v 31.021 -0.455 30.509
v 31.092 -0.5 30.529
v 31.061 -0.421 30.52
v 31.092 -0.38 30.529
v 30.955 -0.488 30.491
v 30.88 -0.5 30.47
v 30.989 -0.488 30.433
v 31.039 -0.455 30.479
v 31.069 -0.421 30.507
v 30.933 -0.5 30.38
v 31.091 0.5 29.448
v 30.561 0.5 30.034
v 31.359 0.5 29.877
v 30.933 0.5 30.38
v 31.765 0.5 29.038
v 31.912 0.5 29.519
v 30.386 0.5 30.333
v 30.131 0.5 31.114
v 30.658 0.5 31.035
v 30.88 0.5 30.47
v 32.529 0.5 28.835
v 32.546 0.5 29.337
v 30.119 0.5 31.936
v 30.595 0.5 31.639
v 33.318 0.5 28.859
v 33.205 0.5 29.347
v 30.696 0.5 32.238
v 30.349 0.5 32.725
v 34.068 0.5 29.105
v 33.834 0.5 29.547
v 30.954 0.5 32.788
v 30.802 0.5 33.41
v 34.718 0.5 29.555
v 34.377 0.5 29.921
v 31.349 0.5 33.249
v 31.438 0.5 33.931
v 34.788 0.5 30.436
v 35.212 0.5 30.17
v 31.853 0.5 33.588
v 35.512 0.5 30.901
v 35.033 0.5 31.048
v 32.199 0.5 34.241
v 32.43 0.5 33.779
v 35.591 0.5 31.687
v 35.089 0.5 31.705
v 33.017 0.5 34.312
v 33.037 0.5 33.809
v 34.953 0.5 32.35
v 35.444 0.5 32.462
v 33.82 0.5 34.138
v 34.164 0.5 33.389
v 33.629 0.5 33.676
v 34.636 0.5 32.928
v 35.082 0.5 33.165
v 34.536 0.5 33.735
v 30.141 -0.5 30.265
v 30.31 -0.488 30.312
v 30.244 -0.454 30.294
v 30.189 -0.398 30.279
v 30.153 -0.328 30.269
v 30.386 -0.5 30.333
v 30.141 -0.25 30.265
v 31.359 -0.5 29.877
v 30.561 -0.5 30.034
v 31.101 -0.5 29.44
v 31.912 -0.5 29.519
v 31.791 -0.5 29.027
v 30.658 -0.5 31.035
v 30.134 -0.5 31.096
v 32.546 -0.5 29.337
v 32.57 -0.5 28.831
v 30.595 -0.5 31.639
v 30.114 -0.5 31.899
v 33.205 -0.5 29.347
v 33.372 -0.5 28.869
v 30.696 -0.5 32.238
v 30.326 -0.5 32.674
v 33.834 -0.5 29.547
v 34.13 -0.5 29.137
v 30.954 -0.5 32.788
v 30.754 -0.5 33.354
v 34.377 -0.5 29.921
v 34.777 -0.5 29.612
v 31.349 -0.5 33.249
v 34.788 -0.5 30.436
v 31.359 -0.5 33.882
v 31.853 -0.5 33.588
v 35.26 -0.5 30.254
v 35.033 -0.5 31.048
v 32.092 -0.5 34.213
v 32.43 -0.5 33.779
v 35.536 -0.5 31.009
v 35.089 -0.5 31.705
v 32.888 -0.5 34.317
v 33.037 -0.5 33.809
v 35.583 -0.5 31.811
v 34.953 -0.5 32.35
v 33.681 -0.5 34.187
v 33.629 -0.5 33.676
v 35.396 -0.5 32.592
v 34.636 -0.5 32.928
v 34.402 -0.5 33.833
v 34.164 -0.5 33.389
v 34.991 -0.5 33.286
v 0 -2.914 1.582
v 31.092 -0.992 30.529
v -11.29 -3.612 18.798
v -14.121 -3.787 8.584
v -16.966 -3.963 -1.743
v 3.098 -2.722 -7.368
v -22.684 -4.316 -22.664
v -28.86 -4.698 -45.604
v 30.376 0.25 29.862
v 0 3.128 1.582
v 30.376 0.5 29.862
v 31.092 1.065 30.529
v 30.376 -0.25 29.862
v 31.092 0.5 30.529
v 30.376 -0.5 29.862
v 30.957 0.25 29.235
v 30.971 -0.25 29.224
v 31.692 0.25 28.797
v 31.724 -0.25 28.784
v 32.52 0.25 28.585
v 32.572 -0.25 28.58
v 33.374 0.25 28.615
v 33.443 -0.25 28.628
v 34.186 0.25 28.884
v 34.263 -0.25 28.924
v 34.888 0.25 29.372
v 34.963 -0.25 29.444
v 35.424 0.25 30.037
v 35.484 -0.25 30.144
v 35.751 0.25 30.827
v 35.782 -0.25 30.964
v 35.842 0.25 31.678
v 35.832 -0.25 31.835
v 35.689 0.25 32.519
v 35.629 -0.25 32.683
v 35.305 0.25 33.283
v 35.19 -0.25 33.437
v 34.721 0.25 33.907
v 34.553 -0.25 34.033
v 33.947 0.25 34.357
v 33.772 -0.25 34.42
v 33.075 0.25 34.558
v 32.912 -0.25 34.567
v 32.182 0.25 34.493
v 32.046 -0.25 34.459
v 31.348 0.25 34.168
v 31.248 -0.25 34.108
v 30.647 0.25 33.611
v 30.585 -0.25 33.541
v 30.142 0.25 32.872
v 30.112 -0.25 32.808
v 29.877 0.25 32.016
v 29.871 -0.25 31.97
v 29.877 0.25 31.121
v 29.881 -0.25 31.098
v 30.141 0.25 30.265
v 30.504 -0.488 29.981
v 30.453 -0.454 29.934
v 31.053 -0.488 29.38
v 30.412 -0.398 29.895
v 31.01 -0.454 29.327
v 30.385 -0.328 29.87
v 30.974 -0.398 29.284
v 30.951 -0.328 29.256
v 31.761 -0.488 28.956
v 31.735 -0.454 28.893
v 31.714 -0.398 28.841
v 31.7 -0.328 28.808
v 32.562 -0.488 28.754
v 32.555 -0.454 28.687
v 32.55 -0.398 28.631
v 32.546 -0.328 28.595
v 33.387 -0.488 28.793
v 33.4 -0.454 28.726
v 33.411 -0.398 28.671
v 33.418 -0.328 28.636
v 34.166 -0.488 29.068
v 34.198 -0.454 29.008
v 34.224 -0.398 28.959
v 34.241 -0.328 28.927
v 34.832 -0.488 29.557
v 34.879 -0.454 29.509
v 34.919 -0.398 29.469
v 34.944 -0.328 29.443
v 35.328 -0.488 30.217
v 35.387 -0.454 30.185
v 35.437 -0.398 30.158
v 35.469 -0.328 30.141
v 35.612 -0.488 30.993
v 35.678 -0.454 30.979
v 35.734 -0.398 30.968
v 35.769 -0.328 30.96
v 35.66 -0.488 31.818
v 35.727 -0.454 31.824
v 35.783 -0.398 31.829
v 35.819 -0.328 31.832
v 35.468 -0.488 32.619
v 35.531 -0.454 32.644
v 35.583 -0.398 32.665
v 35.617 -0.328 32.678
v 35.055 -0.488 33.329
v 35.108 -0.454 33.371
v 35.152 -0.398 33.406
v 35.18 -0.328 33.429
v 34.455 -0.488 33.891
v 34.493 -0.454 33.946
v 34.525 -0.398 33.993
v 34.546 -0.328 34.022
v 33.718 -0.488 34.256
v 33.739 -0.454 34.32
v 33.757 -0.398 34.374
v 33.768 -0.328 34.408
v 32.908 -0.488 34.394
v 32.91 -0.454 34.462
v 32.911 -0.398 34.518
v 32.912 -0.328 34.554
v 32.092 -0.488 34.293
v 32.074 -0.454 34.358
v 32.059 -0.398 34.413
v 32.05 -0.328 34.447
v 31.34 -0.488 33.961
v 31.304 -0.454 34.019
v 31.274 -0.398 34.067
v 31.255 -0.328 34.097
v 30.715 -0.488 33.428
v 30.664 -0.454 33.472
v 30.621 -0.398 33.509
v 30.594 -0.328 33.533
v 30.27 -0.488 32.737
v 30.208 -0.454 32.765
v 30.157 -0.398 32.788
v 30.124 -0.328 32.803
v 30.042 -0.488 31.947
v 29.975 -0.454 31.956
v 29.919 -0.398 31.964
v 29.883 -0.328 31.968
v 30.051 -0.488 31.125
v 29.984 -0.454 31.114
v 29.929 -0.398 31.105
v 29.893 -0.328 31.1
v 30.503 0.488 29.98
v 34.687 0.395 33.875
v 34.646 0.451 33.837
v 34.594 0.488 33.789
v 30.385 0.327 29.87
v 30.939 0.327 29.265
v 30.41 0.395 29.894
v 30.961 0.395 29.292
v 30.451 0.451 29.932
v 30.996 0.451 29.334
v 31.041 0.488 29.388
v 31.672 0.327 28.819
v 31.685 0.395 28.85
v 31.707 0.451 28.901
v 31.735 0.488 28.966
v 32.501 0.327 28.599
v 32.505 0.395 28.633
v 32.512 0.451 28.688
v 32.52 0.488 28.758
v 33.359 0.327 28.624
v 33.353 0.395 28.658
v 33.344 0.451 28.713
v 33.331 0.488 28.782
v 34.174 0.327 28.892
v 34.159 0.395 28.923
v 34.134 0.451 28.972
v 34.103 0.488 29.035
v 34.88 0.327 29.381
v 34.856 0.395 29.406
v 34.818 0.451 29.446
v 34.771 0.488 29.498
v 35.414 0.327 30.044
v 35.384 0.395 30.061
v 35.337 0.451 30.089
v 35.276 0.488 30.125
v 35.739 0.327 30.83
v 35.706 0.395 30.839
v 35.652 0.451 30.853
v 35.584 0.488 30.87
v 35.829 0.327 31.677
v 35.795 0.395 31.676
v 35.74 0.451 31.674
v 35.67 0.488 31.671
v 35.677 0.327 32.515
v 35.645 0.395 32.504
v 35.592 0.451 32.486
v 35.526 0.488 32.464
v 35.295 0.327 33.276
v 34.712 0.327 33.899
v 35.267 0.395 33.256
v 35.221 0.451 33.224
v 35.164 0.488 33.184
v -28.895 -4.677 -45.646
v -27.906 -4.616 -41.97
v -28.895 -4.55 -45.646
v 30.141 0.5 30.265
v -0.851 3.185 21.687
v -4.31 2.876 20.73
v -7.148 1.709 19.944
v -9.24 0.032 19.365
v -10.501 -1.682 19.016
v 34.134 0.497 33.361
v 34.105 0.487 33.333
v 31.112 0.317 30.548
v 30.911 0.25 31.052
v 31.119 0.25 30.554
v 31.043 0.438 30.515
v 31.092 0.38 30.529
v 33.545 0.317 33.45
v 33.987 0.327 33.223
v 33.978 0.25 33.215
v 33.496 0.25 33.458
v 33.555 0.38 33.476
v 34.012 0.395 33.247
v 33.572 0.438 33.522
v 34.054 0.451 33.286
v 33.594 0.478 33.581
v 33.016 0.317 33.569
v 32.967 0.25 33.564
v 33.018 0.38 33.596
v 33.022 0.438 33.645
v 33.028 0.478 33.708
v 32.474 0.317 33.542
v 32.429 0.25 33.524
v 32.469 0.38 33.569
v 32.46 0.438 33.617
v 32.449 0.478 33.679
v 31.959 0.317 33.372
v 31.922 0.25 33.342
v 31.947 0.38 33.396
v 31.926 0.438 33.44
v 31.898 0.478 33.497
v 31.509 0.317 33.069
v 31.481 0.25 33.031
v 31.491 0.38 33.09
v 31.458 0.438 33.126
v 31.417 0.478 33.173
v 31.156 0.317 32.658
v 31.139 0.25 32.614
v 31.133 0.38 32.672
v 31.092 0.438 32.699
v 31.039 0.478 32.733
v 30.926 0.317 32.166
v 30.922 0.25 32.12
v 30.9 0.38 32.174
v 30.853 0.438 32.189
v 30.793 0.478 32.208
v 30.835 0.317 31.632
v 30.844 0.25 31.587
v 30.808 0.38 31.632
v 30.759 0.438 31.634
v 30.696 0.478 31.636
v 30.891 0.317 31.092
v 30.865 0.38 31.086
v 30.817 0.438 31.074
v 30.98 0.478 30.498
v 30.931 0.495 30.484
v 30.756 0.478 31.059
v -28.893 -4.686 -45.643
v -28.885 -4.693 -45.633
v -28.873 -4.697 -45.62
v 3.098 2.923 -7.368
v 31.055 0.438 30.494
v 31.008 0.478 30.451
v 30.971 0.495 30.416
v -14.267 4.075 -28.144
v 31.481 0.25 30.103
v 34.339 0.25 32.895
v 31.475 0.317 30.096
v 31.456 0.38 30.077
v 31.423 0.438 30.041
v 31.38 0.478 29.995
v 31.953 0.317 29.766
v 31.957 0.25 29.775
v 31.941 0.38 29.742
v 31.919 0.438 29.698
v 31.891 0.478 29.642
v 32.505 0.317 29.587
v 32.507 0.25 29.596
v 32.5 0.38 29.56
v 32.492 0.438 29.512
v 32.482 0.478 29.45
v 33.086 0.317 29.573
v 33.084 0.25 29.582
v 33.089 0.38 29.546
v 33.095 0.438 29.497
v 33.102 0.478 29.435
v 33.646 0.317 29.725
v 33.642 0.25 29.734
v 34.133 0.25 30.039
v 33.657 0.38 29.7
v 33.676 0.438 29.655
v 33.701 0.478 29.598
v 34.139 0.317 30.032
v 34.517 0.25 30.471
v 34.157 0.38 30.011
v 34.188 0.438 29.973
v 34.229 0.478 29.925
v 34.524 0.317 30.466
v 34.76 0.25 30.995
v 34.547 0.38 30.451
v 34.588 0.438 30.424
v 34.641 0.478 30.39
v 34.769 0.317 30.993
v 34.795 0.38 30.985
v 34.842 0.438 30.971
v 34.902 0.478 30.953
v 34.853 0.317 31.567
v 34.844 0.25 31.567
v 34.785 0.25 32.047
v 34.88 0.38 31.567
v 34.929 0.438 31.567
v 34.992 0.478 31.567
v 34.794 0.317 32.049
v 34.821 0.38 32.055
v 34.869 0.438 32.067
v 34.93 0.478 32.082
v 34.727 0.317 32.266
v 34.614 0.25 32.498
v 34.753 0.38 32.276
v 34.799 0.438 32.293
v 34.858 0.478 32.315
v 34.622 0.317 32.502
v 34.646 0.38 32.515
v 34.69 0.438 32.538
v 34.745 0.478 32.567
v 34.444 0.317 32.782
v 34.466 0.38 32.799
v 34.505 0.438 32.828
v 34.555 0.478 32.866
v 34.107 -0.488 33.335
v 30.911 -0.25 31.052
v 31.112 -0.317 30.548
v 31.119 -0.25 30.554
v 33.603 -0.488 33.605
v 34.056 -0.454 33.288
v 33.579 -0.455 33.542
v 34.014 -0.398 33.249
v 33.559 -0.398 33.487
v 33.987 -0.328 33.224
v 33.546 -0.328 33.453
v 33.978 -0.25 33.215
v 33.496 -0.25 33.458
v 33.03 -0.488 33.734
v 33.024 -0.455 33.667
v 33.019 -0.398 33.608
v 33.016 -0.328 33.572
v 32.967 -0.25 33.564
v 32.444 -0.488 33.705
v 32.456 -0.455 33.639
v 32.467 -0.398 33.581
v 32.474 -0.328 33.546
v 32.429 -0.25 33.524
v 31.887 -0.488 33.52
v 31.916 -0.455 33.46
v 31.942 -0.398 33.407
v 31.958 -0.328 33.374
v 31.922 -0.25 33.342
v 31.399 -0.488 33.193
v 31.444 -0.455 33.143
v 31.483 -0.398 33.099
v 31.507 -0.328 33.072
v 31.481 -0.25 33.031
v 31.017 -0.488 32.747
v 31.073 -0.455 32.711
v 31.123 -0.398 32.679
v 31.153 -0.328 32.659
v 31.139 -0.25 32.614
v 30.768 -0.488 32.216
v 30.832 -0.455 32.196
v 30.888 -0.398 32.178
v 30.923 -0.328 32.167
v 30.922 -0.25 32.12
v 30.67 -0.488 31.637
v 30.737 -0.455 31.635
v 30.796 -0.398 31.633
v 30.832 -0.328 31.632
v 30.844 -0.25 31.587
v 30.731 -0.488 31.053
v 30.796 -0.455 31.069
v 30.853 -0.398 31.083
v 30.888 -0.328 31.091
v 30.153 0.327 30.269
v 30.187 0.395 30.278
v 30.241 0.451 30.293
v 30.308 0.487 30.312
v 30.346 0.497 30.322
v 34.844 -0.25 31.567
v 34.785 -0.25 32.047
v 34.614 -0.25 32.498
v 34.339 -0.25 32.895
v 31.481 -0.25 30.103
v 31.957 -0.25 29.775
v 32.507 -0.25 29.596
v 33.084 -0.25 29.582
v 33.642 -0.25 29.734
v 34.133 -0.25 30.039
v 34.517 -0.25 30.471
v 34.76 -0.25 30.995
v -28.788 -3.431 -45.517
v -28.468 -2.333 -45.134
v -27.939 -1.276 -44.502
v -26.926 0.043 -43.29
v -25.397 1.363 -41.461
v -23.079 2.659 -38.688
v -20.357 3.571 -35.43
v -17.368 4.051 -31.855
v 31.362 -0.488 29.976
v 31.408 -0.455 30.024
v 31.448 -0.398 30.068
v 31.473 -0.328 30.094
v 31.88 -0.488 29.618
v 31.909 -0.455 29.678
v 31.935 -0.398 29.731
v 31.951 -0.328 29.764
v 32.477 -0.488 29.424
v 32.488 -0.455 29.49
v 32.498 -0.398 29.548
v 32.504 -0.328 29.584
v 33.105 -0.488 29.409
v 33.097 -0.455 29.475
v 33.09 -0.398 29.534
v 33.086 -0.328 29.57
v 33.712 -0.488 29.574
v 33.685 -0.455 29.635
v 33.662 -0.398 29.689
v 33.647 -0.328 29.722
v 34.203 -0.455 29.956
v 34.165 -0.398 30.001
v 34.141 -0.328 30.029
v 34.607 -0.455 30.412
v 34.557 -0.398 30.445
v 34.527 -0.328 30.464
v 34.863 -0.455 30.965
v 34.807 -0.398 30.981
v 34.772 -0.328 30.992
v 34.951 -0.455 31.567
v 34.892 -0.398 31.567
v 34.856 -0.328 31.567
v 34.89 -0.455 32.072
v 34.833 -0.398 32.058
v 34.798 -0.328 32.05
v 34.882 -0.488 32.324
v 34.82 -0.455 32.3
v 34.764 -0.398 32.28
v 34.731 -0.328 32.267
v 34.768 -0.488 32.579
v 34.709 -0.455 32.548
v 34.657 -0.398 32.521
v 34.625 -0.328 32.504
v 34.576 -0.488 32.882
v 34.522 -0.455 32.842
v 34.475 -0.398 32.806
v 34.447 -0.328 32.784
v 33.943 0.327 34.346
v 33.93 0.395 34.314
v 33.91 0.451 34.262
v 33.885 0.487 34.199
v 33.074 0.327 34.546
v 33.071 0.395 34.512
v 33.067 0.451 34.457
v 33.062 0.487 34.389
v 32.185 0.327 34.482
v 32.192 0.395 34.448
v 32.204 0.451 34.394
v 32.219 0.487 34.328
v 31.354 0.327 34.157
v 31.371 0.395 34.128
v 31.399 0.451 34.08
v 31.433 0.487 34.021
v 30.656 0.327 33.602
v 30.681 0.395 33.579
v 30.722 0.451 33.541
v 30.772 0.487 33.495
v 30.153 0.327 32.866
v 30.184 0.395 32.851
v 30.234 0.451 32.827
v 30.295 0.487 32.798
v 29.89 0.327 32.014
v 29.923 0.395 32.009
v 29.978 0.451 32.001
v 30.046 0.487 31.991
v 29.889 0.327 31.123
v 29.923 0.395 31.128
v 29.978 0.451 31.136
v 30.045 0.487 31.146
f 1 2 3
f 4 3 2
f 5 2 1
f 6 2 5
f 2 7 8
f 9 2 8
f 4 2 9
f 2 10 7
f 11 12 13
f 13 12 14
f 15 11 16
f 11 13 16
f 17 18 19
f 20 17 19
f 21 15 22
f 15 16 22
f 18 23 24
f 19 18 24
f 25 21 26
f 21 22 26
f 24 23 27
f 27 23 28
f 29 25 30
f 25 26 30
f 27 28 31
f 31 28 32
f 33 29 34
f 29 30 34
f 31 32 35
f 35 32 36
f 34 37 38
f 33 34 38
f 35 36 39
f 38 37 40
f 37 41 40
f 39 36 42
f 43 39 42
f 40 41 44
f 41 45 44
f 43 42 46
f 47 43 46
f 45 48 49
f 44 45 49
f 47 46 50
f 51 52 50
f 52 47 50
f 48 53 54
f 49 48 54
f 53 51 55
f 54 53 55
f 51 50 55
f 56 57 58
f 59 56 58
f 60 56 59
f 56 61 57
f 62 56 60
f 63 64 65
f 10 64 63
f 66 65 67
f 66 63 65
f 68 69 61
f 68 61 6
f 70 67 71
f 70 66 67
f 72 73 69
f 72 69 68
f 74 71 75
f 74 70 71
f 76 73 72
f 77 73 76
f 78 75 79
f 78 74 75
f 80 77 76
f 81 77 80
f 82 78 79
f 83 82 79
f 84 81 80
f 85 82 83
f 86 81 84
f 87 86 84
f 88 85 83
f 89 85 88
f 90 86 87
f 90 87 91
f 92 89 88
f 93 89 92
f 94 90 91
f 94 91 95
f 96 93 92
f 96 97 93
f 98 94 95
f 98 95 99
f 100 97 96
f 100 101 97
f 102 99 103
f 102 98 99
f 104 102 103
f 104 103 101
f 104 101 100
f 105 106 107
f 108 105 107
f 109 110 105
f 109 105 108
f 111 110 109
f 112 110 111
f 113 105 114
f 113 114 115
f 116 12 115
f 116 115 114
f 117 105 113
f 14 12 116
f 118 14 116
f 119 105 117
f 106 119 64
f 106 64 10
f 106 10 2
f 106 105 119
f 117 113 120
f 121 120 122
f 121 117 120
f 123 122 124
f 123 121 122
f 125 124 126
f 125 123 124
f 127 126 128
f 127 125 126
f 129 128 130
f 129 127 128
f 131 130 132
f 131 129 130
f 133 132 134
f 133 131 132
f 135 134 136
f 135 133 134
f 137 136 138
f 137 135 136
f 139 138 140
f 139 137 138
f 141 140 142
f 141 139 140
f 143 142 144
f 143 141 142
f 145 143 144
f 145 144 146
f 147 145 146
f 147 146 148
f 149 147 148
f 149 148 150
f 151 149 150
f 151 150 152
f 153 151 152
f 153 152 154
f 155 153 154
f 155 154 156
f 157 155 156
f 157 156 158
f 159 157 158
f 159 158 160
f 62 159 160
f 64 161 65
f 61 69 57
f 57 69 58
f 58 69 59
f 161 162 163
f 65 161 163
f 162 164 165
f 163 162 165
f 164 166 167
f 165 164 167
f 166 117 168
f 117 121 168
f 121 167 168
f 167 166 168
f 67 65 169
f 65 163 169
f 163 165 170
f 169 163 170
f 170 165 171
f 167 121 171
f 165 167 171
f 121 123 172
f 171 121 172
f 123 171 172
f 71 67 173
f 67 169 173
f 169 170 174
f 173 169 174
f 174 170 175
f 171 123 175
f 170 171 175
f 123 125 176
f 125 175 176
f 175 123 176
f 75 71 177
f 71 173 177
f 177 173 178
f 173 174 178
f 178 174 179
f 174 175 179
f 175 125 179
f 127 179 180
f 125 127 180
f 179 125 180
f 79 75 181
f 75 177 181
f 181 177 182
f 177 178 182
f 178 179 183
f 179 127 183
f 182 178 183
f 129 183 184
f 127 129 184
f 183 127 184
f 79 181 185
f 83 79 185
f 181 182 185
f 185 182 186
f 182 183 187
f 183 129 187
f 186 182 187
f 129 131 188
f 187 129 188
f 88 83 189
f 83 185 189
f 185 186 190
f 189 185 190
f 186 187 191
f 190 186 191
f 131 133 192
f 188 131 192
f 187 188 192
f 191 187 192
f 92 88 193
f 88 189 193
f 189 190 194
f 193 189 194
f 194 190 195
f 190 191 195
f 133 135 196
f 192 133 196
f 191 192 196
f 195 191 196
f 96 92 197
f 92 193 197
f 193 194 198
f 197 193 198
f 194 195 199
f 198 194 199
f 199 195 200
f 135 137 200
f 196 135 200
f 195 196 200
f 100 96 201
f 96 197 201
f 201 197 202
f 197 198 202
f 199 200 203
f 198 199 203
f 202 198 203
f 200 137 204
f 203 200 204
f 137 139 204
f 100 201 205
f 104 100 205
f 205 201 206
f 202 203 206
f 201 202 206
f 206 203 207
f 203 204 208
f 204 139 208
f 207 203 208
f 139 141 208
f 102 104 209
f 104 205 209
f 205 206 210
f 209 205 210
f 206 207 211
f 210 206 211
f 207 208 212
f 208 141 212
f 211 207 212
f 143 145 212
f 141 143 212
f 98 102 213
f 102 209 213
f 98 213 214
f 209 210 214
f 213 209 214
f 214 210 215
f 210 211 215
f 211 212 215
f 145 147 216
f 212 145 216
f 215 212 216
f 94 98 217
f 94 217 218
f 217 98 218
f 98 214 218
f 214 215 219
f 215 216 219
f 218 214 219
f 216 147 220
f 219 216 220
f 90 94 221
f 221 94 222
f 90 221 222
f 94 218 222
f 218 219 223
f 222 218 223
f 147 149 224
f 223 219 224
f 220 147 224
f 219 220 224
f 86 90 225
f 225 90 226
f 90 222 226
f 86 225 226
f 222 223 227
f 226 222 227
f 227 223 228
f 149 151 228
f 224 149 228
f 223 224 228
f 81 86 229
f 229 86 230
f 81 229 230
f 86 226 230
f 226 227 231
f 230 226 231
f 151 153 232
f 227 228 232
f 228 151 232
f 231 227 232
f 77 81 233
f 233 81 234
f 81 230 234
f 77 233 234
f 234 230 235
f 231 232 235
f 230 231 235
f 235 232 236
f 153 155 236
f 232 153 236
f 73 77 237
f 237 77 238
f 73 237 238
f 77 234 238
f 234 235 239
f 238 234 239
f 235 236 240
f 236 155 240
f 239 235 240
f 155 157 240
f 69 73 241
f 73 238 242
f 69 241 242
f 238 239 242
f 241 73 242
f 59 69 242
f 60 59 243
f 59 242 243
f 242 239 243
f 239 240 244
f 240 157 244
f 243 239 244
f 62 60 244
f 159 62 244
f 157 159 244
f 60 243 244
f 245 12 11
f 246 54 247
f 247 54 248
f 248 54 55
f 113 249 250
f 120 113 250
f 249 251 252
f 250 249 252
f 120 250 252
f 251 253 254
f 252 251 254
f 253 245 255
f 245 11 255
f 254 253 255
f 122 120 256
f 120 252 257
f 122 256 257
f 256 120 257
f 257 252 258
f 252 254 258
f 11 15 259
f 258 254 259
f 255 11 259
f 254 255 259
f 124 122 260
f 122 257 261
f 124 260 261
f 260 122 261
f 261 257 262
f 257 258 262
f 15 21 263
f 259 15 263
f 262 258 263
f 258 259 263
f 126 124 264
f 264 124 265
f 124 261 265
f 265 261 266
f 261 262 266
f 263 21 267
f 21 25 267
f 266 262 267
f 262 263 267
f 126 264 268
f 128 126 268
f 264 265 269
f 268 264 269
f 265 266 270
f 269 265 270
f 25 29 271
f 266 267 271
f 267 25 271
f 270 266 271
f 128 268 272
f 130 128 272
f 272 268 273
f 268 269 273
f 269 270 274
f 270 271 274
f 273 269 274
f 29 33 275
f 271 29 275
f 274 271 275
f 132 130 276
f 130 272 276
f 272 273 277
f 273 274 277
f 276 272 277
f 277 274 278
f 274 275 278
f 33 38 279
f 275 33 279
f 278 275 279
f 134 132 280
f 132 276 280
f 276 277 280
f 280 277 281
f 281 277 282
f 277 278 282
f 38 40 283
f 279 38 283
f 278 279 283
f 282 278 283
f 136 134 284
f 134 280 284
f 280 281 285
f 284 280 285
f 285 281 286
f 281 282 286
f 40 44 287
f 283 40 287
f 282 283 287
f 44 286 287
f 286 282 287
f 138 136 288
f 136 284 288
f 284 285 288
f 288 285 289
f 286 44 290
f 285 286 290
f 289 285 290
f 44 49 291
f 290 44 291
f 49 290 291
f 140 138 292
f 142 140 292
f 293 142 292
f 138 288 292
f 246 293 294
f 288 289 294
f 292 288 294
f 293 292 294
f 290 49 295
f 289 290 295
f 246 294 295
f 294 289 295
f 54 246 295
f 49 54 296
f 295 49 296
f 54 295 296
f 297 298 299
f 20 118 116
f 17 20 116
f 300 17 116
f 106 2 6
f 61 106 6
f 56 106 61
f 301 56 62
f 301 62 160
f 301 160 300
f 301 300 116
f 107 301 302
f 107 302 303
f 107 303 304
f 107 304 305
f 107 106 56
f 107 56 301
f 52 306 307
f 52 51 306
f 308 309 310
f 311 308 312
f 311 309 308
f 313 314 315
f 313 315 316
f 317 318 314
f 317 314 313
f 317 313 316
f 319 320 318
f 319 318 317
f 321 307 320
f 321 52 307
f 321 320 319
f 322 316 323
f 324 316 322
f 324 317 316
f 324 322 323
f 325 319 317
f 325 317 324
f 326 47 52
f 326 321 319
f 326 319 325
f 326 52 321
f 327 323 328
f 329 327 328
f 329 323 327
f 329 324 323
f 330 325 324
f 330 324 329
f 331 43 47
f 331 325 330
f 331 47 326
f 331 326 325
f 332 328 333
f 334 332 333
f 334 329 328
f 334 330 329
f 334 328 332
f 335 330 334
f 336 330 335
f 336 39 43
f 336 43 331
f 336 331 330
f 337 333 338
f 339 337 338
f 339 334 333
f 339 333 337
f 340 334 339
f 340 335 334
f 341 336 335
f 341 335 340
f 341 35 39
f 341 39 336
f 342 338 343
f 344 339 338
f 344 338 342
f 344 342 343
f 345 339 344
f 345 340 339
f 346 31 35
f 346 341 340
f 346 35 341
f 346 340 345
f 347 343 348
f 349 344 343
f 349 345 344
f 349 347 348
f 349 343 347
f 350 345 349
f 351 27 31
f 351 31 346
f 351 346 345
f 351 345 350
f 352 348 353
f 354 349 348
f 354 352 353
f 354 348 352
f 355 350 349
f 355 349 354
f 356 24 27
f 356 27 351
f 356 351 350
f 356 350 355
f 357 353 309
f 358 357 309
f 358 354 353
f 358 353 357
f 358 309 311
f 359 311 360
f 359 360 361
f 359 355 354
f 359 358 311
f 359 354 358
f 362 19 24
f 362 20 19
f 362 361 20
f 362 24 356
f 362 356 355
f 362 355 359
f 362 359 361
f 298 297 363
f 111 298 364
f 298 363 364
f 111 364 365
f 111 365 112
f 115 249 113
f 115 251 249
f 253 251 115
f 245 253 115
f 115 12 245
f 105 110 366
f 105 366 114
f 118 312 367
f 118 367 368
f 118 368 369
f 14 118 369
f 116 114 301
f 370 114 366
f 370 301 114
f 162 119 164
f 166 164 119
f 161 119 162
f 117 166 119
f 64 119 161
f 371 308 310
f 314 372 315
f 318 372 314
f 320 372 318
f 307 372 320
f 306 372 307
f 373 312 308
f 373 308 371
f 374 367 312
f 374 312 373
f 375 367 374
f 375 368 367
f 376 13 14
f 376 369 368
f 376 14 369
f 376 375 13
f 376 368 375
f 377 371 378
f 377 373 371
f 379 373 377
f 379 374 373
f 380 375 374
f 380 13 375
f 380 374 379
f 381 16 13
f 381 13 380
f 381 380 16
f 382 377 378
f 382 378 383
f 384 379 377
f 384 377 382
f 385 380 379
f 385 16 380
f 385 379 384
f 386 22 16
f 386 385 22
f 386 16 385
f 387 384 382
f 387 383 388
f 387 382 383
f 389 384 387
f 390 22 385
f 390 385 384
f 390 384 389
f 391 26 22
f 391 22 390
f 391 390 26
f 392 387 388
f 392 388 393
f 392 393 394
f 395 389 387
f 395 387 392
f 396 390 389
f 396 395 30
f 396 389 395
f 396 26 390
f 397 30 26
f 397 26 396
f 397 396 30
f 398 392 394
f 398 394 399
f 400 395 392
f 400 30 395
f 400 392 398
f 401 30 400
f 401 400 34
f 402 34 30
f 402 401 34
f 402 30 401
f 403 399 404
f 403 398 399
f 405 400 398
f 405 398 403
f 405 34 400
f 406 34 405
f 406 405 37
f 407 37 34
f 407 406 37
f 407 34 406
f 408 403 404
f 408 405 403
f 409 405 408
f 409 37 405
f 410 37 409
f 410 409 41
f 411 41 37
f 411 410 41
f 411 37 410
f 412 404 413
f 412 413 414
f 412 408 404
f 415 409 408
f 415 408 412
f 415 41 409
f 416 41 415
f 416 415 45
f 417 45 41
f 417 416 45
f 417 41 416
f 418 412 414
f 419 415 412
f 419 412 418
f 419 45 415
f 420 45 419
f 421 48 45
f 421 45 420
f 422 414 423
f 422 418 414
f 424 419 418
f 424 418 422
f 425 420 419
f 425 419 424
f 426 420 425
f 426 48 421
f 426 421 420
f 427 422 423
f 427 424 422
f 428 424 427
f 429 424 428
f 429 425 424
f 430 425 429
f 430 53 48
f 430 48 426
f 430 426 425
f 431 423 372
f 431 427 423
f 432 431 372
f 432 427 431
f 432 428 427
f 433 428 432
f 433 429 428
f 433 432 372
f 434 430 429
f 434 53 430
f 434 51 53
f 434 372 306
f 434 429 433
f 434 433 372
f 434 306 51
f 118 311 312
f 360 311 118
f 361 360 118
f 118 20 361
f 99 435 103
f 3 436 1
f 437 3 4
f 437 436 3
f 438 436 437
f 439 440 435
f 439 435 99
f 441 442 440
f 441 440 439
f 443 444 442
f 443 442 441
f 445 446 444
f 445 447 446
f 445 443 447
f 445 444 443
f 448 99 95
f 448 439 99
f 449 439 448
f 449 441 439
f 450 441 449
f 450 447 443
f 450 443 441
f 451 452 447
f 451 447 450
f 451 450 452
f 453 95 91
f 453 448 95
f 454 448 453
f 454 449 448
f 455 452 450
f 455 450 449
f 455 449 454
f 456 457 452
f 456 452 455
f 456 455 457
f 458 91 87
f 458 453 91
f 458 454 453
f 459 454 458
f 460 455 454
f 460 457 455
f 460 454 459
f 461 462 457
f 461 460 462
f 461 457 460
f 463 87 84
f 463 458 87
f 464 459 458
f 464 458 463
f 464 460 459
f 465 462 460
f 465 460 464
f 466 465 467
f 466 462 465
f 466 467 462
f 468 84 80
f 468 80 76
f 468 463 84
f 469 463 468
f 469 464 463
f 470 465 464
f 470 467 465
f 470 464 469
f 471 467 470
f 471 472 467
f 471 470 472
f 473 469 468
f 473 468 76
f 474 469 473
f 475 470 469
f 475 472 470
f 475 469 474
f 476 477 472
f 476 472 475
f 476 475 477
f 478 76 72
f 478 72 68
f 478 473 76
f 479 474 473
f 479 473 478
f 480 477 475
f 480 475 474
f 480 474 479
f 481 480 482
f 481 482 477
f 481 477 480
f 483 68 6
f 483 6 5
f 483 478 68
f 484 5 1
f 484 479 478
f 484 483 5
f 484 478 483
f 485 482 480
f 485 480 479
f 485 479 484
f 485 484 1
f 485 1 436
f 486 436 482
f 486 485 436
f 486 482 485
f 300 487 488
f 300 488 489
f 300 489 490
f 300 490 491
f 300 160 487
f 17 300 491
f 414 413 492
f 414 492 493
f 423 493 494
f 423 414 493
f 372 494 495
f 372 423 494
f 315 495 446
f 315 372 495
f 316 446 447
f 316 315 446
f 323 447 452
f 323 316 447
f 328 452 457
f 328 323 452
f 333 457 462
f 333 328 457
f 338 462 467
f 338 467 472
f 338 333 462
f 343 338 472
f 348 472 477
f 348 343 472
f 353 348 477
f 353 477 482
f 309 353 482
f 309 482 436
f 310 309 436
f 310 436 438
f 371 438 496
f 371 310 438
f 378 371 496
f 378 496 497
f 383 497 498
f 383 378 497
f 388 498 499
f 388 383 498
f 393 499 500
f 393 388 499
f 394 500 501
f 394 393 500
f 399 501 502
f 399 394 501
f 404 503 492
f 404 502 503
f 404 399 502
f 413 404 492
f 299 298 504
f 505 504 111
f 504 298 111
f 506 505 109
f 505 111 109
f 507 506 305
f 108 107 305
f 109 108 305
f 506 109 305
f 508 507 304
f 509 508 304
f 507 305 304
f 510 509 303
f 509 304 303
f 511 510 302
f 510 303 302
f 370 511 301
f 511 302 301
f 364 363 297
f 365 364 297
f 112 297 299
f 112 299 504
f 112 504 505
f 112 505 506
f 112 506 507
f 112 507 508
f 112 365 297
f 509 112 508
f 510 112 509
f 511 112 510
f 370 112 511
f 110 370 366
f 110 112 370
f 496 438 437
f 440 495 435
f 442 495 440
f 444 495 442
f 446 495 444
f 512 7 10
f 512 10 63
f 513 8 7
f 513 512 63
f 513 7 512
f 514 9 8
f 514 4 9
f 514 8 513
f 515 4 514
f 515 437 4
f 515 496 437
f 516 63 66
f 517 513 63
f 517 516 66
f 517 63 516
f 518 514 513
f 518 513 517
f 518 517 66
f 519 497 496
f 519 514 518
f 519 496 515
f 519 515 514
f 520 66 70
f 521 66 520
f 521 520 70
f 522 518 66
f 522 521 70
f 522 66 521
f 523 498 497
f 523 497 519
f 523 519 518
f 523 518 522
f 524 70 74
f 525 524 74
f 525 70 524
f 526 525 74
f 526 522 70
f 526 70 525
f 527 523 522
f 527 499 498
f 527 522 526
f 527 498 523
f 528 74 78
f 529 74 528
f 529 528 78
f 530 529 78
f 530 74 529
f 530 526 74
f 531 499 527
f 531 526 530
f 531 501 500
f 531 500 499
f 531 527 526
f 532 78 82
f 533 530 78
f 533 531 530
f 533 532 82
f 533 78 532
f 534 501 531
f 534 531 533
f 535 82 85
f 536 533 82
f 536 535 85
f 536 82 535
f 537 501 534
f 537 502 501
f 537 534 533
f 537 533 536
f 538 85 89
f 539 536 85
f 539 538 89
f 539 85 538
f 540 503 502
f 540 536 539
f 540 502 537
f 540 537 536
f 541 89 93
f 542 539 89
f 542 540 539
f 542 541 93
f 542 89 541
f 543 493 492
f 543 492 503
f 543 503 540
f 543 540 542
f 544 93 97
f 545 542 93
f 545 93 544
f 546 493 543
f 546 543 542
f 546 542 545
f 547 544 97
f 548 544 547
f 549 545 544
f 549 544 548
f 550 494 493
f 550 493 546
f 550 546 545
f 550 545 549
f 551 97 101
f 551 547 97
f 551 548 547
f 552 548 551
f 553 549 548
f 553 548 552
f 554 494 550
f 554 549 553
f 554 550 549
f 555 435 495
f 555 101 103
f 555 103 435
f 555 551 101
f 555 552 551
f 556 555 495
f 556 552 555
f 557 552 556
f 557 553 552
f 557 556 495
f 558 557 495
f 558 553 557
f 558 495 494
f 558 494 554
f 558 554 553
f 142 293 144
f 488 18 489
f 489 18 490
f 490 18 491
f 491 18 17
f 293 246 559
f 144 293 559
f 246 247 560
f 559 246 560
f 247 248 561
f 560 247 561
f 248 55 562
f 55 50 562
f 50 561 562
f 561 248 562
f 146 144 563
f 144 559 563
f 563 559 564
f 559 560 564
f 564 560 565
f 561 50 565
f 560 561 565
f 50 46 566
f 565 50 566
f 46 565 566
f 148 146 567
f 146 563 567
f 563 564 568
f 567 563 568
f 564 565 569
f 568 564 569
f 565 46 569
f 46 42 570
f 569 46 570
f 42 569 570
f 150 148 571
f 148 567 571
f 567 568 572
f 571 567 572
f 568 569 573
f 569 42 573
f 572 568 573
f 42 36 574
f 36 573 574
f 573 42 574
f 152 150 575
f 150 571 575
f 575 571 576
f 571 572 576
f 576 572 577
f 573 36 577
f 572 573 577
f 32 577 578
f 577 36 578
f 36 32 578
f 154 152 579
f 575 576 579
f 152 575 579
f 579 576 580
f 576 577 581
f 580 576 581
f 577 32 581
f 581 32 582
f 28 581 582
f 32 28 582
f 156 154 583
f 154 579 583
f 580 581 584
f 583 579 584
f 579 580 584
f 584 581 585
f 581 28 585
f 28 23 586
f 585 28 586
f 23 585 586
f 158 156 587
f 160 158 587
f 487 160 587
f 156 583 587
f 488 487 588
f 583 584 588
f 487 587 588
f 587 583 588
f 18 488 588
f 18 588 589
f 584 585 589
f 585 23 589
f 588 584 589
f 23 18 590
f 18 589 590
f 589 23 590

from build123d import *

# Parameters (mm, degrees)
F1_DEPTH      = 5
F1_DEPTH_BACK = 5
F2_W          = 100.360032171
F2_H          = 34.278569743
F3_DEPTH      = 63.9
F3_DEPTH_BACK = 50
F4_R          = 0.0218183936
F5_T1_DEPTH   = 111.9716351384
F6_R          = 3
F6_R_2        = 2
F7_DEPTH      = 0.5
F7_DEPTH_BACK = 0.5
F8_T4_ANGLE   = 359.64
F8_T9_ANGLE   = 359.64
F8_T34_ANGLE  = 359.64
F8_T39_ANGLE  = 359.64


# Not quite as in the source:
# - a fillet or chamfer that OpenCascade refuses, or shapes differently, is made with other operations: its cross-section is extruded or revolved along the edge and cut away or added


with BuildPart() as f1:
    # F0 (on Front) → F1 (new body, two sides)
    with BuildSketch(Plane.XZ) as f1_sk:
        Polygon((31.0921985656, 30.5286794901), (-11.5655744448, 18.7216177583), (-28.8952961564, -45.6459186971), (3.0980354641, -7.3681822978), (0, 1.582333236), align=None)
    extrude(amount=F1_DEPTH)
    extrude(f1_sk.sketch, amount=-F1_DEPTH_BACK)

    # F2 (on Top) → F3 (cut, two sides)
    with BuildSketch(Plane.XY) as f3_sk:
        with Locations((1.9043665379, 3.6182934418)):
            Rectangle(F2_W, F2_H)
        Polygon((-39.0896312892, -5.3307767957), (-39.0896312892, 5.7227437609), (47.1330322325, 0), align=None, mode=Mode.SUBTRACT)
    extrude(amount=-F3_DEPTH, mode=Mode.SUBTRACT)
    extrude(f3_sk.sketch, amount=F3_DEPTH_BACK, mode=Mode.SUBTRACT)

    # F4
    f4_edges = [f1.edges().sort_by_distance(p)[0] for p in [
        (-20.230435, -4.164794, -13.46215),
    ]]
    fillet(f4_edges, radius=F4_R)

    # F5: fillet of radius 9 on 2 edges, made by hand

    # F5_s2 → F5_t1 (cut)
    with BuildSketch(Plane(origin=(10.1347631785, -0.6726613442, 37.6434053136), x_dir=(-0.0662259794, -0.99780465, 0), z_dir=(-0.259934786, 0.0172523106, -0.9654720425))):
        with BuildLine():
            ThreePointArc((6.4541084226, 15.6543338505), (-0.2785467468, 13.2370471707), (-3.1214312203, 6.6727552521))
            Line((-3.1214312203, 6.6727552521), (-3.1214312203, 16.2679345229))
            Line((-3.1214312203, 16.2679345229), (6.4541084226, 15.6543338505))
        make_face()
    extrude(amount=F5_T1_DEPTH, mode=Mode.SUBTRACT)

    # F6 (on Front) → F7 (join, two sides)
    with BuildSketch(Plane.XZ) as f7_sk:
        with Locations((32.8437015414, 31.5673612058)):
            Circle(F6_R)
        with Locations((32.8437015414, 31.5673612058)):
            Circle(F6_R_2, mode=Mode.SUBTRACT)
    extrude(amount=F7_DEPTH)
    extrude(f7_sk.sketch, amount=-F7_DEPTH_BACK)

    # F8: fillet of radius 0.25 on 4 edges, made by hand


with BuildPart() as f8_tool2:
    # F8_s3 → F8_t4 (revolve)
    with BuildSketch(Plane(origin=(-5.375639349, 0, 9.1752631985), x_dir=(0, 1, 0), z_dir=(-0.5055120978, 0, 0.8628195171))):
        with BuildLine():
            ThreePointArc((0.25, -41.2958696863), (0.4267766953, -41.369092991), (0.5, -41.5458696863))
            Line((0.5, -41.5458696863), (0.5, -41.2958696863))
            Line((0.5, -41.2958696863), (0.25, -41.2958696863))
        make_face()
    revolve(axis=Axis((32.8437015414, 0.5, 31.5673612058), (0, -1, 0)), revolution_arc=F8_T4_ANGLE)

    split(bisect_by=Plane(origin=(-0.7891478665, 0, 0.8476490244), x_dir=(0, 1, 0), z_dir=(0.6813988218, 0, -0.731912321)), keep=Keep.TOP)


with BuildPart() as f1_1:
    add(f1.part)

    # F8_t1: cut F8_tool2
    add(f8_tool2.part, mode=Mode.SUBTRACT)


with BuildPart() as f8_tool7:
    # F8_s8 → F8_t9 (revolve)
    with BuildSketch(Plane(origin=(-5.375639349, 0, 9.1752631985), x_dir=(0, 1, 0), z_dir=(-0.5055120978, 0, 0.8628195171))):
        with BuildLine():
            ThreePointArc((0.25, -41.2958696863), (0.4267766953, -41.369092991), (0.5, -41.5458696863))
            Line((0.5, -41.5458696863), (0.5, -41.2958696863))
            Line((0.5, -41.2958696863), (0.25, -41.2958696863))
        make_face()
    revolve(axis=Axis((32.8437015414, 0.5, 31.5673612058), (0, -1, 0)), revolution_arc=F8_T9_ANGLE)

    split(bisect_by=Plane(origin=(-5.636132621, 0, 20.3628024875), x_dir=(0, 1, 0), z_dir=(-0.2667561154, 0, 0.963764066)), keep=Keep.TOP)


with BuildPart() as f1_2:
    add(f1_1.part)

    # F8_t6: cut F8_tool7
    add(f8_tool7.part, mode=Mode.SUBTRACT)


with BuildPart() as f8_tool12:
    # F8_s13 → F8_t14 (revolve)
    with BuildSketch(Plane.XY.offset(31.5673612058)):
        with BuildLine():
            ThreePointArc((35.0937015414, -0.5), (34.9169248461, -0.4267766953), (34.8437015414, -0.25))
            Line((34.8437015414, -0.25), (34.8437015414, -0.5))
            Line((34.8437015414, -0.5), (35.0937015414, -0.5))
        make_face()
    revolve(axis=Axis((32.8437015414, -0.5, 31.5673612058), (0, -1, 0)))

    split(bisect_by=Plane(origin=(-0.7891478665, 0, 0.8476490244), x_dir=(0, 1, 0), z_dir=(0.6813988218, 0, -0.731912321)), keep=Keep.TOP)


with BuildPart() as f1_3:
    add(f1_2.part)

    # F8_t11: cut F8_tool12
    add(f8_tool12.part, mode=Mode.SUBTRACT)


with BuildPart() as f8_tool17:
    # F8_s18 → F8_t19 (revolve)
    with BuildSketch(Plane.XY.offset(31.5673612058)):
        with BuildLine():
            ThreePointArc((35.0937015414, -0.5), (34.9169248461, -0.4267766953), (34.8437015414, -0.25))
            Line((34.8437015414, -0.25), (34.8437015414, -0.5))
            Line((34.8437015414, -0.5), (35.0937015414, -0.5))
        make_face()
    revolve(axis=Axis((32.8437015414, -0.5, 31.5673612058), (0, -1, 0)))

    split(bisect_by=Plane(origin=(-5.636132621, 0, 20.3628024875), x_dir=(0, 1, 0), z_dir=(-0.2667561154, 0, 0.963764066)), keep=Keep.TOP)


with BuildPart() as f1_4:
    add(f1_3.part)

    # F8_t16: cut F8_tool17
    add(f8_tool17.part, mode=Mode.SUBTRACT)


with BuildPart() as f8_tool22:
    # F8_s23 → F8_t24 (revolve)
    with BuildSketch(Plane.XY.offset(31.5673612058)):
        with BuildLine():
            ThreePointArc((34.8437015414, 0.25), (34.9169248461, 0.4267766953), (35.0937015414, 0.5))
            Line((35.0937015414, 0.5), (34.8437015414, 0.5))
            Line((34.8437015414, 0.5), (34.8437015414, 0.25))
        make_face()
    revolve(axis=Axis((32.8437015414, 0.5, 31.5673612058), (0, -1, 0)))

    split(bisect_by=Plane(origin=(-0.7891478665, 0, 0.8476490244), x_dir=(0, 1, 0), z_dir=(0.6813988218, 0, -0.731912321)), keep=Keep.TOP)


with BuildPart() as f1_5:
    add(f1_4.part)

    # F8_t21: cut F8_tool22
    add(f8_tool22.part, mode=Mode.SUBTRACT)


with BuildPart() as f8_tool27:
    # F8_s28 → F8_t29 (revolve)
    with BuildSketch(Plane.XY.offset(31.5673612058)):
        with BuildLine():
            ThreePointArc((34.8437015414, 0.25), (34.9169248461, 0.4267766953), (35.0937015414, 0.5))
            Line((35.0937015414, 0.5), (34.8437015414, 0.5))
            Line((34.8437015414, 0.5), (34.8437015414, 0.25))
        make_face()
    revolve(axis=Axis((32.8437015414, 0.5, 31.5673612058), (0, -1, 0)))

    split(bisect_by=Plane(origin=(-5.636132621, 0, 20.3628024875), x_dir=(0, 1, 0), z_dir=(-0.2667561154, 0, 0.963764066)), keep=Keep.TOP)


with BuildPart() as f1_6:
    add(f1_5.part)

    # F8_t26: cut F8_tool27
    add(f8_tool27.part, mode=Mode.SUBTRACT)


with BuildPart() as f8_tool32:
    # F8_s33 → F8_t34 (revolve)
    with BuildSketch(Plane(origin=(-5.375639349, 0, 9.1752631985), x_dir=(0, 1, 0), z_dir=(-0.5055120978, 0, 0.8628195171))):
        with BuildLine():
            ThreePointArc((-0.5, -41.5458696863), (-0.4267766953, -41.369092991), (-0.25, -41.2958696863))
            Line((-0.25, -41.2958696863), (-0.5, -41.2958696863))
            Line((-0.5, -41.2958696863), (-0.5, -41.5458696863))
        make_face()
    revolve(axis=Axis((32.8437015414, -0.5, 31.5673612058), (0, -1, 0)), revolution_arc=F8_T34_ANGLE)

    split(bisect_by=Plane(origin=(-0.7891478665, 0, 0.8476490244), x_dir=(0, 1, 0), z_dir=(0.6813988218, 0, -0.731912321)), keep=Keep.TOP)


with BuildPart() as f1_7:
    add(f1_6.part)

    # F8_t31: cut F8_tool32
    add(f8_tool32.part, mode=Mode.SUBTRACT)


with BuildPart() as f8_tool37:
    # F8_s38 → F8_t39 (revolve)
    with BuildSketch(Plane(origin=(-5.375639349, 0, 9.1752631985), x_dir=(0, 1, 0), z_dir=(-0.5055120978, 0, 0.8628195171))):
        with BuildLine():
            ThreePointArc((-0.5, -41.5458696863), (-0.4267766953, -41.369092991), (-0.25, -41.2958696863))
            Line((-0.25, -41.2958696863), (-0.5, -41.2958696863))
            Line((-0.5, -41.2958696863), (-0.5, -41.5458696863))
        make_face()
    revolve(axis=Axis((32.8437015414, -0.5, 31.5673612058), (0, -1, 0)), revolution_arc=F8_T39_ANGLE)

    split(bisect_by=Plane(origin=(-5.636132621, 0, 20.3628024875), x_dir=(0, 1, 0), z_dir=(-0.2667561154, 0, 0.963764066)), keep=Keep.TOP)


with BuildPart() as f1_8:
    add(f1_7.part)

    # F8_t36: cut F8_tool37
    add(f8_tool37.part, mode=Mode.SUBTRACT)


solid = f1_8.part
